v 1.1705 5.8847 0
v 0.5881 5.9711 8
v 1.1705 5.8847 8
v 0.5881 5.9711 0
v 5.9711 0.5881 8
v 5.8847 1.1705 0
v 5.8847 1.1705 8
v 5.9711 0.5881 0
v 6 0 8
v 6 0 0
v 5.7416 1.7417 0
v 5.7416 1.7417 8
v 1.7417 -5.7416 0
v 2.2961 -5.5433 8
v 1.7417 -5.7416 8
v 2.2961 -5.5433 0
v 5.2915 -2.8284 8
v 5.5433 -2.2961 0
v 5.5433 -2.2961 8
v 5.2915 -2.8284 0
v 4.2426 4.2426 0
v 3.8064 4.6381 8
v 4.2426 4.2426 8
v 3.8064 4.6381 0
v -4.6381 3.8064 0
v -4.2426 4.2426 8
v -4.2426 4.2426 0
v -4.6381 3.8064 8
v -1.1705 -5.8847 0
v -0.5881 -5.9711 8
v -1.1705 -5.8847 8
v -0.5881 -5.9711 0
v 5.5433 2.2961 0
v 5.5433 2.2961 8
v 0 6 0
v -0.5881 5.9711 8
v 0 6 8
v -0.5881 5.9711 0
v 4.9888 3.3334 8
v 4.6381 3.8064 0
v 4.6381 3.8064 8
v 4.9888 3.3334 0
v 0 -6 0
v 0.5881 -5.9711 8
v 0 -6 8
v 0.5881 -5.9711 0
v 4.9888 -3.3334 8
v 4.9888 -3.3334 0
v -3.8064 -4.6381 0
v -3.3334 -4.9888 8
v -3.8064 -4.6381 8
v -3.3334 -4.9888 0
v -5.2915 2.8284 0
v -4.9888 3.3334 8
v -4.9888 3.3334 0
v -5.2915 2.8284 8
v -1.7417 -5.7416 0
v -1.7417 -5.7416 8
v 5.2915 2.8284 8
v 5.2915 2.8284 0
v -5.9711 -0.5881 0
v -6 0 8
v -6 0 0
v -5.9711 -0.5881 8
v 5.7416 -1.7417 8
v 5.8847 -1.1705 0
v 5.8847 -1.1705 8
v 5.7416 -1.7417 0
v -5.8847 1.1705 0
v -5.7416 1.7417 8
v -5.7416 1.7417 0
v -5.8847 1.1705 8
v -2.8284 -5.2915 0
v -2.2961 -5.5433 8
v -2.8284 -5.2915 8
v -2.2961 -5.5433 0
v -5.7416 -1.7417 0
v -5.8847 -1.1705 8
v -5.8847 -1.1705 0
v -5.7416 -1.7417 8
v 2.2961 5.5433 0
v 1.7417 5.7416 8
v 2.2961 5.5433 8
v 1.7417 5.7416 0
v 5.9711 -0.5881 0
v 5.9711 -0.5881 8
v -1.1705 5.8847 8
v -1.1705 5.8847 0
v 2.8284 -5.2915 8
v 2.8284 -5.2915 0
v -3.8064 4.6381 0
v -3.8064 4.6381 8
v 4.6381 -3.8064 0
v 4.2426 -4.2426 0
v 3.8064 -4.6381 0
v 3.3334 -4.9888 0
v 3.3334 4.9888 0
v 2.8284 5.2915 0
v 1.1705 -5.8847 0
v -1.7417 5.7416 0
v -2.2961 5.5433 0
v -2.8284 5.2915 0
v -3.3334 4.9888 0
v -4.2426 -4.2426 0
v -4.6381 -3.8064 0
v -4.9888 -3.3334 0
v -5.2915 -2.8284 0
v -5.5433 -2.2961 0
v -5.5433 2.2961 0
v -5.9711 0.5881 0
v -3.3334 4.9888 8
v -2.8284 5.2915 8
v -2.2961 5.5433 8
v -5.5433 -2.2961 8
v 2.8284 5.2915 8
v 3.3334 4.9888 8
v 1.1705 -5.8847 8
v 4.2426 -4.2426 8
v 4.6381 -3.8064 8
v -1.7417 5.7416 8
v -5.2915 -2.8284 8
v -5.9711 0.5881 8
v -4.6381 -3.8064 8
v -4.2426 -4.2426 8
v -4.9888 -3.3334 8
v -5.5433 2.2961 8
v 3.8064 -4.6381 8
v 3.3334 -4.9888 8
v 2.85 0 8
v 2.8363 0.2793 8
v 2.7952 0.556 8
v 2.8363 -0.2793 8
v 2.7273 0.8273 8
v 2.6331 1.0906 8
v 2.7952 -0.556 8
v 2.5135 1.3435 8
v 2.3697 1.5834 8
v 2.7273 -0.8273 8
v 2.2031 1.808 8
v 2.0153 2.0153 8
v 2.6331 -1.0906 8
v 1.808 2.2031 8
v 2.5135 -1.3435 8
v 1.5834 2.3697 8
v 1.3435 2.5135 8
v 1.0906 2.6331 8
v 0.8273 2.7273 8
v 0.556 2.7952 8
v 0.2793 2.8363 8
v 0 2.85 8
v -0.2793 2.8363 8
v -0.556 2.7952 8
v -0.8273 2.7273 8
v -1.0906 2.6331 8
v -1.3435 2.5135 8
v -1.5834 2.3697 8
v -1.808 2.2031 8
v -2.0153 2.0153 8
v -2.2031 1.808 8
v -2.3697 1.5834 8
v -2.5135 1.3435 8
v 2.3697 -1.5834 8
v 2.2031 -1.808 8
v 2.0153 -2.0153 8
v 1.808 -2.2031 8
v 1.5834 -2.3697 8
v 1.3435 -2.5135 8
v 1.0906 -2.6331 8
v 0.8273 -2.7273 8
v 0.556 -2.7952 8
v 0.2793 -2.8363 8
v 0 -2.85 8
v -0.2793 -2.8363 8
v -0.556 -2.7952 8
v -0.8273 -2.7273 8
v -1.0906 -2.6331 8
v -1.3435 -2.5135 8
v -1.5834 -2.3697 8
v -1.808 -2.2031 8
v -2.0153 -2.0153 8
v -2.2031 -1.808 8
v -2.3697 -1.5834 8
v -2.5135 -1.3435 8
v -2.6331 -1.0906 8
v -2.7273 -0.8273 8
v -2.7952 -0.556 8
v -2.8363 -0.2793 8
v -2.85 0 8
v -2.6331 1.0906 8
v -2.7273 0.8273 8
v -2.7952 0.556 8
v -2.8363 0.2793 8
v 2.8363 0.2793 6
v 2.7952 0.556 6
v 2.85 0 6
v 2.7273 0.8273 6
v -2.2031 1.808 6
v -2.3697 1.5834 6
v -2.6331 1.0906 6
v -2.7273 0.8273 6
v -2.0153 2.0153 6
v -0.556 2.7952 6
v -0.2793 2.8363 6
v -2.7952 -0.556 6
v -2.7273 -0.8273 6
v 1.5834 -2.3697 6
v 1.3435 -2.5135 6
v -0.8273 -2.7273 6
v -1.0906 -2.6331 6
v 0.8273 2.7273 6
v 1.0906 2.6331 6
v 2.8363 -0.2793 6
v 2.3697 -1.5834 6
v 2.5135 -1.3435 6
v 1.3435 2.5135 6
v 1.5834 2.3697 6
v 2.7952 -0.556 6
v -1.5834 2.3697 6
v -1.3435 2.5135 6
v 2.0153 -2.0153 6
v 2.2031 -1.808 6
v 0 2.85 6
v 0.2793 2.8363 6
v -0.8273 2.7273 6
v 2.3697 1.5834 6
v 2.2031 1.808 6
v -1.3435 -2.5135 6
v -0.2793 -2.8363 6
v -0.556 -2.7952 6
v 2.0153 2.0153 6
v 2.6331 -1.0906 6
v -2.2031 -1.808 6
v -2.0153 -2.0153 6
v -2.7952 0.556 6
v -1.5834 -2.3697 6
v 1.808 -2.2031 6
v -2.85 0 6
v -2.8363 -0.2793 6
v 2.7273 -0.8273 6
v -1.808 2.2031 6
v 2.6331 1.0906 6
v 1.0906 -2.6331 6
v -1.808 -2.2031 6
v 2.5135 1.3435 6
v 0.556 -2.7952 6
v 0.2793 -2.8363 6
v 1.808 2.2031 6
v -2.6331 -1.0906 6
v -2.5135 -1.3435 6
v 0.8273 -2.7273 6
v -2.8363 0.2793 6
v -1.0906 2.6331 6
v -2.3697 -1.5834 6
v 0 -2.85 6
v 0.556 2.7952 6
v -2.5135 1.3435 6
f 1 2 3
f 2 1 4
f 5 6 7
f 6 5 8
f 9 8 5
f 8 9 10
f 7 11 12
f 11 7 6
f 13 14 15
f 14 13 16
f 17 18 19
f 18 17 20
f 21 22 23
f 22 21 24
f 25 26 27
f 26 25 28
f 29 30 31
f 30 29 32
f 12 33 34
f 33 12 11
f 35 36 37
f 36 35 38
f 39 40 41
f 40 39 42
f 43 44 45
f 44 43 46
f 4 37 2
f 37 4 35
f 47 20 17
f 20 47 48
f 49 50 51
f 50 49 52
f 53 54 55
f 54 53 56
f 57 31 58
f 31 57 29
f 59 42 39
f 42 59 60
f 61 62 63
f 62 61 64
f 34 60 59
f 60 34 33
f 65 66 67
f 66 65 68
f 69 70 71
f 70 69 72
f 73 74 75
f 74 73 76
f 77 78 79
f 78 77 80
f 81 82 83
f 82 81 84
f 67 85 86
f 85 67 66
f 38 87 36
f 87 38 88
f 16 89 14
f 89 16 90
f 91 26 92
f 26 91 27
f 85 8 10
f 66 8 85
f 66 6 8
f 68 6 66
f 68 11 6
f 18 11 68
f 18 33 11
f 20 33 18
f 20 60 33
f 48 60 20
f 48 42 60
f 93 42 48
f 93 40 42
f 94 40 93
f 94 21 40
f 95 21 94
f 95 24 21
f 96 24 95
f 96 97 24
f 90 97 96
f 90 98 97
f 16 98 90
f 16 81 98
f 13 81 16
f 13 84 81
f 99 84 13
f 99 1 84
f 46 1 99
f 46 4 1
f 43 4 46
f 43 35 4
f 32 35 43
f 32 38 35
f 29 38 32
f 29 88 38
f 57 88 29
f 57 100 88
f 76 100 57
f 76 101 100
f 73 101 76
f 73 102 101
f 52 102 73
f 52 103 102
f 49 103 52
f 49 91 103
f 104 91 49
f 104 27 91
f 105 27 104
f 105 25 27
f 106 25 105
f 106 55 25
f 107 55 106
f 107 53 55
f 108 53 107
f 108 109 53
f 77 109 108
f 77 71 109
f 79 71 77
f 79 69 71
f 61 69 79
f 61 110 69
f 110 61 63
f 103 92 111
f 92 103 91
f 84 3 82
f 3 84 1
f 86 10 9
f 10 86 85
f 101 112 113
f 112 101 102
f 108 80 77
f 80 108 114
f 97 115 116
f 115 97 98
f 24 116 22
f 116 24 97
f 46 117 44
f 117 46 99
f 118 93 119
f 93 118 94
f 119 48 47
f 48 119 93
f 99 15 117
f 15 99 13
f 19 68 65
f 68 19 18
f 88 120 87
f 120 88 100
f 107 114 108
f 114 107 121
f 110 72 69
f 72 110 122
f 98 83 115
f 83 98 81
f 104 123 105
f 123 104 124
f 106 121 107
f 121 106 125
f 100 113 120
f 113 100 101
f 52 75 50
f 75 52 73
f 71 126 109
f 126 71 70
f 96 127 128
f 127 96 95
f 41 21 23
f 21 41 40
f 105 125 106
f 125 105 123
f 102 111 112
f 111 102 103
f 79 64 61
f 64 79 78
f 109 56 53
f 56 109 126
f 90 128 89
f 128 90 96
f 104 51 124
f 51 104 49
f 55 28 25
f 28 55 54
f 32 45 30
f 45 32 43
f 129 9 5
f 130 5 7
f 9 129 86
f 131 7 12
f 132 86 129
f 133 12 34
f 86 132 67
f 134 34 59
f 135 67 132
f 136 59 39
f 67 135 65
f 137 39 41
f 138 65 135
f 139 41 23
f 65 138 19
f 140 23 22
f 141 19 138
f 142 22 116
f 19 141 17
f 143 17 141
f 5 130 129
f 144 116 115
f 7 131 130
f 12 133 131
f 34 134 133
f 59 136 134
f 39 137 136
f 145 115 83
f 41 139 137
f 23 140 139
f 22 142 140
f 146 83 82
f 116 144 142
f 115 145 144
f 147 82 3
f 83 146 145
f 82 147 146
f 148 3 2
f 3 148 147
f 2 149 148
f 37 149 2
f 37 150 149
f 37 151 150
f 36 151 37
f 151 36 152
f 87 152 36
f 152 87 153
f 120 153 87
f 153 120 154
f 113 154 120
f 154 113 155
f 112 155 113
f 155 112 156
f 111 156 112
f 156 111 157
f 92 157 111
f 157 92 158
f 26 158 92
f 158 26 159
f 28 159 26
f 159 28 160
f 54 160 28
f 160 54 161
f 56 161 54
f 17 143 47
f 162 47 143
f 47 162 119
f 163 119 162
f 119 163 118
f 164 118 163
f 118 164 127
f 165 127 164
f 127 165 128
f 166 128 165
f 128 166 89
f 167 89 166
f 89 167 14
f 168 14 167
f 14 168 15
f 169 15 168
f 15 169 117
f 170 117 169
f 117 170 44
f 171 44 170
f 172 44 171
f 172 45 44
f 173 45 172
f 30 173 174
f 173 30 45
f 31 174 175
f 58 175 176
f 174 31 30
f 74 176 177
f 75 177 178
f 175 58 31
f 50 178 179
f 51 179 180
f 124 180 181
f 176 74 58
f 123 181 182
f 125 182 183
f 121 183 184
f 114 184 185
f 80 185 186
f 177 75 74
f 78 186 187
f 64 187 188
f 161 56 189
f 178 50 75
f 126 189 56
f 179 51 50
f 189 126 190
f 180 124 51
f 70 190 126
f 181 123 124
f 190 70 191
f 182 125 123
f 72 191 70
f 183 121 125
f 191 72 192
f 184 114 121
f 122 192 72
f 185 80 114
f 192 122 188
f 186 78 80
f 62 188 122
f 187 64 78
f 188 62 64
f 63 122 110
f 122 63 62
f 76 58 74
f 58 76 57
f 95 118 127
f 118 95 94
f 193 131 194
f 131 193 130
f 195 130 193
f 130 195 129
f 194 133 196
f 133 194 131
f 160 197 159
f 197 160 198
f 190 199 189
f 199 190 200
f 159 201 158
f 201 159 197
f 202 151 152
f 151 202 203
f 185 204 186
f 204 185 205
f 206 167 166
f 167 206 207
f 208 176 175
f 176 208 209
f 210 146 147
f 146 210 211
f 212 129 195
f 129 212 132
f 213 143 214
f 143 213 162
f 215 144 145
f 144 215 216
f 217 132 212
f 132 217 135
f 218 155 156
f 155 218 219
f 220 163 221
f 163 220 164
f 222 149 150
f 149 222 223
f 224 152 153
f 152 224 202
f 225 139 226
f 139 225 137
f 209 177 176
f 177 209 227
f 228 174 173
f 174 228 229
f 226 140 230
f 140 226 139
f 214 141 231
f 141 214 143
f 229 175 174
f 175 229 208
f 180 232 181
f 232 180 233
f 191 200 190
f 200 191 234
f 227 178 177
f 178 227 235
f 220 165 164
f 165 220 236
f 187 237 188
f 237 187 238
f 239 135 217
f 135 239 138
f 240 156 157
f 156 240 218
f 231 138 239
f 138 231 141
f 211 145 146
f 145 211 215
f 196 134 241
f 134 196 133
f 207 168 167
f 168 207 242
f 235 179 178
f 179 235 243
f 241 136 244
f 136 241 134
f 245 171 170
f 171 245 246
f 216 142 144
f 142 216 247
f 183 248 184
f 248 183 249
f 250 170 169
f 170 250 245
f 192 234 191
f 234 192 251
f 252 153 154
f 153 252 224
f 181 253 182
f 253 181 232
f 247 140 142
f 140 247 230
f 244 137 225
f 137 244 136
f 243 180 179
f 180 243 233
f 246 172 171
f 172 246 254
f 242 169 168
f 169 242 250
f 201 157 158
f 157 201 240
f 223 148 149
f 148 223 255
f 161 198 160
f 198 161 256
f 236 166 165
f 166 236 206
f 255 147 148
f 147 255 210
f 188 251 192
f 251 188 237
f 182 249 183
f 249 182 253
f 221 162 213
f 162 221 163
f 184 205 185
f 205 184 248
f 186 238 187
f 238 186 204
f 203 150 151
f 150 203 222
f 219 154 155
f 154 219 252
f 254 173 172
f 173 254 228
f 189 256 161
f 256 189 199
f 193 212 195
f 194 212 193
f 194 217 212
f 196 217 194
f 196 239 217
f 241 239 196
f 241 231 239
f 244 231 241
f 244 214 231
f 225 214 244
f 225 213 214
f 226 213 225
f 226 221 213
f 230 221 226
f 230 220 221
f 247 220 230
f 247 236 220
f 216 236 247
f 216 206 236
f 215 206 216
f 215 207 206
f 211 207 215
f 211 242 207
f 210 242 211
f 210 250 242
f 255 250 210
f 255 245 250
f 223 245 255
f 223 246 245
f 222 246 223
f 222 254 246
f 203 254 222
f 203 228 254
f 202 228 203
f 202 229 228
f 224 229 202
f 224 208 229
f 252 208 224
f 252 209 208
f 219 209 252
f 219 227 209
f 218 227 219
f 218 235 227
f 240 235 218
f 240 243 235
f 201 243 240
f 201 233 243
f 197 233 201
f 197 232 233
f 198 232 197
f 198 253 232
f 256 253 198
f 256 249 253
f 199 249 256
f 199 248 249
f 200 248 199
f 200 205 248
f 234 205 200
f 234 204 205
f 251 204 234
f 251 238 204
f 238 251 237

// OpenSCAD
// A printed boss with a hole sized for an interference (press-fit) insert.
// The insert is sized 0.30 mm larger in diameter than the hole — 0.15 mm
// radial interference, mid-band of the FN spec range (-0.20 .. -0.10 mm).
//
// Demonstrates: FN fit class within spec, plus the `clash_whitelist`
// annotation suppressing the hard-clash BLOCK that would otherwise fire
// on this geometry. (Without the whitelist this example would BLOCK on
// hard_clash:boss~insert by ~16 mm³.)
//
// part: boss
// part: insert
// fit: boss~insert class=FN
// clash_whitelist: boss~insert
// gravity: -z

boss_outer    = 12;
boss_inner    = 5.7;
boss_height   = 8;
insert_outer  = 6.0;
insert_height = 6;

module boss() {
    difference() {
        cylinder(h=boss_height, d=boss_outer, $fn=64);
        translate([0, 0, -0.1])
            cylinder(h=boss_height + 0.2, d=boss_inner, $fn=64);
    }
}

module insert() {
    cylinder(h=insert_height, d=insert_outer, $fn=64);
}

module assembly() {
    boss();
    insert();
}

assembly();
